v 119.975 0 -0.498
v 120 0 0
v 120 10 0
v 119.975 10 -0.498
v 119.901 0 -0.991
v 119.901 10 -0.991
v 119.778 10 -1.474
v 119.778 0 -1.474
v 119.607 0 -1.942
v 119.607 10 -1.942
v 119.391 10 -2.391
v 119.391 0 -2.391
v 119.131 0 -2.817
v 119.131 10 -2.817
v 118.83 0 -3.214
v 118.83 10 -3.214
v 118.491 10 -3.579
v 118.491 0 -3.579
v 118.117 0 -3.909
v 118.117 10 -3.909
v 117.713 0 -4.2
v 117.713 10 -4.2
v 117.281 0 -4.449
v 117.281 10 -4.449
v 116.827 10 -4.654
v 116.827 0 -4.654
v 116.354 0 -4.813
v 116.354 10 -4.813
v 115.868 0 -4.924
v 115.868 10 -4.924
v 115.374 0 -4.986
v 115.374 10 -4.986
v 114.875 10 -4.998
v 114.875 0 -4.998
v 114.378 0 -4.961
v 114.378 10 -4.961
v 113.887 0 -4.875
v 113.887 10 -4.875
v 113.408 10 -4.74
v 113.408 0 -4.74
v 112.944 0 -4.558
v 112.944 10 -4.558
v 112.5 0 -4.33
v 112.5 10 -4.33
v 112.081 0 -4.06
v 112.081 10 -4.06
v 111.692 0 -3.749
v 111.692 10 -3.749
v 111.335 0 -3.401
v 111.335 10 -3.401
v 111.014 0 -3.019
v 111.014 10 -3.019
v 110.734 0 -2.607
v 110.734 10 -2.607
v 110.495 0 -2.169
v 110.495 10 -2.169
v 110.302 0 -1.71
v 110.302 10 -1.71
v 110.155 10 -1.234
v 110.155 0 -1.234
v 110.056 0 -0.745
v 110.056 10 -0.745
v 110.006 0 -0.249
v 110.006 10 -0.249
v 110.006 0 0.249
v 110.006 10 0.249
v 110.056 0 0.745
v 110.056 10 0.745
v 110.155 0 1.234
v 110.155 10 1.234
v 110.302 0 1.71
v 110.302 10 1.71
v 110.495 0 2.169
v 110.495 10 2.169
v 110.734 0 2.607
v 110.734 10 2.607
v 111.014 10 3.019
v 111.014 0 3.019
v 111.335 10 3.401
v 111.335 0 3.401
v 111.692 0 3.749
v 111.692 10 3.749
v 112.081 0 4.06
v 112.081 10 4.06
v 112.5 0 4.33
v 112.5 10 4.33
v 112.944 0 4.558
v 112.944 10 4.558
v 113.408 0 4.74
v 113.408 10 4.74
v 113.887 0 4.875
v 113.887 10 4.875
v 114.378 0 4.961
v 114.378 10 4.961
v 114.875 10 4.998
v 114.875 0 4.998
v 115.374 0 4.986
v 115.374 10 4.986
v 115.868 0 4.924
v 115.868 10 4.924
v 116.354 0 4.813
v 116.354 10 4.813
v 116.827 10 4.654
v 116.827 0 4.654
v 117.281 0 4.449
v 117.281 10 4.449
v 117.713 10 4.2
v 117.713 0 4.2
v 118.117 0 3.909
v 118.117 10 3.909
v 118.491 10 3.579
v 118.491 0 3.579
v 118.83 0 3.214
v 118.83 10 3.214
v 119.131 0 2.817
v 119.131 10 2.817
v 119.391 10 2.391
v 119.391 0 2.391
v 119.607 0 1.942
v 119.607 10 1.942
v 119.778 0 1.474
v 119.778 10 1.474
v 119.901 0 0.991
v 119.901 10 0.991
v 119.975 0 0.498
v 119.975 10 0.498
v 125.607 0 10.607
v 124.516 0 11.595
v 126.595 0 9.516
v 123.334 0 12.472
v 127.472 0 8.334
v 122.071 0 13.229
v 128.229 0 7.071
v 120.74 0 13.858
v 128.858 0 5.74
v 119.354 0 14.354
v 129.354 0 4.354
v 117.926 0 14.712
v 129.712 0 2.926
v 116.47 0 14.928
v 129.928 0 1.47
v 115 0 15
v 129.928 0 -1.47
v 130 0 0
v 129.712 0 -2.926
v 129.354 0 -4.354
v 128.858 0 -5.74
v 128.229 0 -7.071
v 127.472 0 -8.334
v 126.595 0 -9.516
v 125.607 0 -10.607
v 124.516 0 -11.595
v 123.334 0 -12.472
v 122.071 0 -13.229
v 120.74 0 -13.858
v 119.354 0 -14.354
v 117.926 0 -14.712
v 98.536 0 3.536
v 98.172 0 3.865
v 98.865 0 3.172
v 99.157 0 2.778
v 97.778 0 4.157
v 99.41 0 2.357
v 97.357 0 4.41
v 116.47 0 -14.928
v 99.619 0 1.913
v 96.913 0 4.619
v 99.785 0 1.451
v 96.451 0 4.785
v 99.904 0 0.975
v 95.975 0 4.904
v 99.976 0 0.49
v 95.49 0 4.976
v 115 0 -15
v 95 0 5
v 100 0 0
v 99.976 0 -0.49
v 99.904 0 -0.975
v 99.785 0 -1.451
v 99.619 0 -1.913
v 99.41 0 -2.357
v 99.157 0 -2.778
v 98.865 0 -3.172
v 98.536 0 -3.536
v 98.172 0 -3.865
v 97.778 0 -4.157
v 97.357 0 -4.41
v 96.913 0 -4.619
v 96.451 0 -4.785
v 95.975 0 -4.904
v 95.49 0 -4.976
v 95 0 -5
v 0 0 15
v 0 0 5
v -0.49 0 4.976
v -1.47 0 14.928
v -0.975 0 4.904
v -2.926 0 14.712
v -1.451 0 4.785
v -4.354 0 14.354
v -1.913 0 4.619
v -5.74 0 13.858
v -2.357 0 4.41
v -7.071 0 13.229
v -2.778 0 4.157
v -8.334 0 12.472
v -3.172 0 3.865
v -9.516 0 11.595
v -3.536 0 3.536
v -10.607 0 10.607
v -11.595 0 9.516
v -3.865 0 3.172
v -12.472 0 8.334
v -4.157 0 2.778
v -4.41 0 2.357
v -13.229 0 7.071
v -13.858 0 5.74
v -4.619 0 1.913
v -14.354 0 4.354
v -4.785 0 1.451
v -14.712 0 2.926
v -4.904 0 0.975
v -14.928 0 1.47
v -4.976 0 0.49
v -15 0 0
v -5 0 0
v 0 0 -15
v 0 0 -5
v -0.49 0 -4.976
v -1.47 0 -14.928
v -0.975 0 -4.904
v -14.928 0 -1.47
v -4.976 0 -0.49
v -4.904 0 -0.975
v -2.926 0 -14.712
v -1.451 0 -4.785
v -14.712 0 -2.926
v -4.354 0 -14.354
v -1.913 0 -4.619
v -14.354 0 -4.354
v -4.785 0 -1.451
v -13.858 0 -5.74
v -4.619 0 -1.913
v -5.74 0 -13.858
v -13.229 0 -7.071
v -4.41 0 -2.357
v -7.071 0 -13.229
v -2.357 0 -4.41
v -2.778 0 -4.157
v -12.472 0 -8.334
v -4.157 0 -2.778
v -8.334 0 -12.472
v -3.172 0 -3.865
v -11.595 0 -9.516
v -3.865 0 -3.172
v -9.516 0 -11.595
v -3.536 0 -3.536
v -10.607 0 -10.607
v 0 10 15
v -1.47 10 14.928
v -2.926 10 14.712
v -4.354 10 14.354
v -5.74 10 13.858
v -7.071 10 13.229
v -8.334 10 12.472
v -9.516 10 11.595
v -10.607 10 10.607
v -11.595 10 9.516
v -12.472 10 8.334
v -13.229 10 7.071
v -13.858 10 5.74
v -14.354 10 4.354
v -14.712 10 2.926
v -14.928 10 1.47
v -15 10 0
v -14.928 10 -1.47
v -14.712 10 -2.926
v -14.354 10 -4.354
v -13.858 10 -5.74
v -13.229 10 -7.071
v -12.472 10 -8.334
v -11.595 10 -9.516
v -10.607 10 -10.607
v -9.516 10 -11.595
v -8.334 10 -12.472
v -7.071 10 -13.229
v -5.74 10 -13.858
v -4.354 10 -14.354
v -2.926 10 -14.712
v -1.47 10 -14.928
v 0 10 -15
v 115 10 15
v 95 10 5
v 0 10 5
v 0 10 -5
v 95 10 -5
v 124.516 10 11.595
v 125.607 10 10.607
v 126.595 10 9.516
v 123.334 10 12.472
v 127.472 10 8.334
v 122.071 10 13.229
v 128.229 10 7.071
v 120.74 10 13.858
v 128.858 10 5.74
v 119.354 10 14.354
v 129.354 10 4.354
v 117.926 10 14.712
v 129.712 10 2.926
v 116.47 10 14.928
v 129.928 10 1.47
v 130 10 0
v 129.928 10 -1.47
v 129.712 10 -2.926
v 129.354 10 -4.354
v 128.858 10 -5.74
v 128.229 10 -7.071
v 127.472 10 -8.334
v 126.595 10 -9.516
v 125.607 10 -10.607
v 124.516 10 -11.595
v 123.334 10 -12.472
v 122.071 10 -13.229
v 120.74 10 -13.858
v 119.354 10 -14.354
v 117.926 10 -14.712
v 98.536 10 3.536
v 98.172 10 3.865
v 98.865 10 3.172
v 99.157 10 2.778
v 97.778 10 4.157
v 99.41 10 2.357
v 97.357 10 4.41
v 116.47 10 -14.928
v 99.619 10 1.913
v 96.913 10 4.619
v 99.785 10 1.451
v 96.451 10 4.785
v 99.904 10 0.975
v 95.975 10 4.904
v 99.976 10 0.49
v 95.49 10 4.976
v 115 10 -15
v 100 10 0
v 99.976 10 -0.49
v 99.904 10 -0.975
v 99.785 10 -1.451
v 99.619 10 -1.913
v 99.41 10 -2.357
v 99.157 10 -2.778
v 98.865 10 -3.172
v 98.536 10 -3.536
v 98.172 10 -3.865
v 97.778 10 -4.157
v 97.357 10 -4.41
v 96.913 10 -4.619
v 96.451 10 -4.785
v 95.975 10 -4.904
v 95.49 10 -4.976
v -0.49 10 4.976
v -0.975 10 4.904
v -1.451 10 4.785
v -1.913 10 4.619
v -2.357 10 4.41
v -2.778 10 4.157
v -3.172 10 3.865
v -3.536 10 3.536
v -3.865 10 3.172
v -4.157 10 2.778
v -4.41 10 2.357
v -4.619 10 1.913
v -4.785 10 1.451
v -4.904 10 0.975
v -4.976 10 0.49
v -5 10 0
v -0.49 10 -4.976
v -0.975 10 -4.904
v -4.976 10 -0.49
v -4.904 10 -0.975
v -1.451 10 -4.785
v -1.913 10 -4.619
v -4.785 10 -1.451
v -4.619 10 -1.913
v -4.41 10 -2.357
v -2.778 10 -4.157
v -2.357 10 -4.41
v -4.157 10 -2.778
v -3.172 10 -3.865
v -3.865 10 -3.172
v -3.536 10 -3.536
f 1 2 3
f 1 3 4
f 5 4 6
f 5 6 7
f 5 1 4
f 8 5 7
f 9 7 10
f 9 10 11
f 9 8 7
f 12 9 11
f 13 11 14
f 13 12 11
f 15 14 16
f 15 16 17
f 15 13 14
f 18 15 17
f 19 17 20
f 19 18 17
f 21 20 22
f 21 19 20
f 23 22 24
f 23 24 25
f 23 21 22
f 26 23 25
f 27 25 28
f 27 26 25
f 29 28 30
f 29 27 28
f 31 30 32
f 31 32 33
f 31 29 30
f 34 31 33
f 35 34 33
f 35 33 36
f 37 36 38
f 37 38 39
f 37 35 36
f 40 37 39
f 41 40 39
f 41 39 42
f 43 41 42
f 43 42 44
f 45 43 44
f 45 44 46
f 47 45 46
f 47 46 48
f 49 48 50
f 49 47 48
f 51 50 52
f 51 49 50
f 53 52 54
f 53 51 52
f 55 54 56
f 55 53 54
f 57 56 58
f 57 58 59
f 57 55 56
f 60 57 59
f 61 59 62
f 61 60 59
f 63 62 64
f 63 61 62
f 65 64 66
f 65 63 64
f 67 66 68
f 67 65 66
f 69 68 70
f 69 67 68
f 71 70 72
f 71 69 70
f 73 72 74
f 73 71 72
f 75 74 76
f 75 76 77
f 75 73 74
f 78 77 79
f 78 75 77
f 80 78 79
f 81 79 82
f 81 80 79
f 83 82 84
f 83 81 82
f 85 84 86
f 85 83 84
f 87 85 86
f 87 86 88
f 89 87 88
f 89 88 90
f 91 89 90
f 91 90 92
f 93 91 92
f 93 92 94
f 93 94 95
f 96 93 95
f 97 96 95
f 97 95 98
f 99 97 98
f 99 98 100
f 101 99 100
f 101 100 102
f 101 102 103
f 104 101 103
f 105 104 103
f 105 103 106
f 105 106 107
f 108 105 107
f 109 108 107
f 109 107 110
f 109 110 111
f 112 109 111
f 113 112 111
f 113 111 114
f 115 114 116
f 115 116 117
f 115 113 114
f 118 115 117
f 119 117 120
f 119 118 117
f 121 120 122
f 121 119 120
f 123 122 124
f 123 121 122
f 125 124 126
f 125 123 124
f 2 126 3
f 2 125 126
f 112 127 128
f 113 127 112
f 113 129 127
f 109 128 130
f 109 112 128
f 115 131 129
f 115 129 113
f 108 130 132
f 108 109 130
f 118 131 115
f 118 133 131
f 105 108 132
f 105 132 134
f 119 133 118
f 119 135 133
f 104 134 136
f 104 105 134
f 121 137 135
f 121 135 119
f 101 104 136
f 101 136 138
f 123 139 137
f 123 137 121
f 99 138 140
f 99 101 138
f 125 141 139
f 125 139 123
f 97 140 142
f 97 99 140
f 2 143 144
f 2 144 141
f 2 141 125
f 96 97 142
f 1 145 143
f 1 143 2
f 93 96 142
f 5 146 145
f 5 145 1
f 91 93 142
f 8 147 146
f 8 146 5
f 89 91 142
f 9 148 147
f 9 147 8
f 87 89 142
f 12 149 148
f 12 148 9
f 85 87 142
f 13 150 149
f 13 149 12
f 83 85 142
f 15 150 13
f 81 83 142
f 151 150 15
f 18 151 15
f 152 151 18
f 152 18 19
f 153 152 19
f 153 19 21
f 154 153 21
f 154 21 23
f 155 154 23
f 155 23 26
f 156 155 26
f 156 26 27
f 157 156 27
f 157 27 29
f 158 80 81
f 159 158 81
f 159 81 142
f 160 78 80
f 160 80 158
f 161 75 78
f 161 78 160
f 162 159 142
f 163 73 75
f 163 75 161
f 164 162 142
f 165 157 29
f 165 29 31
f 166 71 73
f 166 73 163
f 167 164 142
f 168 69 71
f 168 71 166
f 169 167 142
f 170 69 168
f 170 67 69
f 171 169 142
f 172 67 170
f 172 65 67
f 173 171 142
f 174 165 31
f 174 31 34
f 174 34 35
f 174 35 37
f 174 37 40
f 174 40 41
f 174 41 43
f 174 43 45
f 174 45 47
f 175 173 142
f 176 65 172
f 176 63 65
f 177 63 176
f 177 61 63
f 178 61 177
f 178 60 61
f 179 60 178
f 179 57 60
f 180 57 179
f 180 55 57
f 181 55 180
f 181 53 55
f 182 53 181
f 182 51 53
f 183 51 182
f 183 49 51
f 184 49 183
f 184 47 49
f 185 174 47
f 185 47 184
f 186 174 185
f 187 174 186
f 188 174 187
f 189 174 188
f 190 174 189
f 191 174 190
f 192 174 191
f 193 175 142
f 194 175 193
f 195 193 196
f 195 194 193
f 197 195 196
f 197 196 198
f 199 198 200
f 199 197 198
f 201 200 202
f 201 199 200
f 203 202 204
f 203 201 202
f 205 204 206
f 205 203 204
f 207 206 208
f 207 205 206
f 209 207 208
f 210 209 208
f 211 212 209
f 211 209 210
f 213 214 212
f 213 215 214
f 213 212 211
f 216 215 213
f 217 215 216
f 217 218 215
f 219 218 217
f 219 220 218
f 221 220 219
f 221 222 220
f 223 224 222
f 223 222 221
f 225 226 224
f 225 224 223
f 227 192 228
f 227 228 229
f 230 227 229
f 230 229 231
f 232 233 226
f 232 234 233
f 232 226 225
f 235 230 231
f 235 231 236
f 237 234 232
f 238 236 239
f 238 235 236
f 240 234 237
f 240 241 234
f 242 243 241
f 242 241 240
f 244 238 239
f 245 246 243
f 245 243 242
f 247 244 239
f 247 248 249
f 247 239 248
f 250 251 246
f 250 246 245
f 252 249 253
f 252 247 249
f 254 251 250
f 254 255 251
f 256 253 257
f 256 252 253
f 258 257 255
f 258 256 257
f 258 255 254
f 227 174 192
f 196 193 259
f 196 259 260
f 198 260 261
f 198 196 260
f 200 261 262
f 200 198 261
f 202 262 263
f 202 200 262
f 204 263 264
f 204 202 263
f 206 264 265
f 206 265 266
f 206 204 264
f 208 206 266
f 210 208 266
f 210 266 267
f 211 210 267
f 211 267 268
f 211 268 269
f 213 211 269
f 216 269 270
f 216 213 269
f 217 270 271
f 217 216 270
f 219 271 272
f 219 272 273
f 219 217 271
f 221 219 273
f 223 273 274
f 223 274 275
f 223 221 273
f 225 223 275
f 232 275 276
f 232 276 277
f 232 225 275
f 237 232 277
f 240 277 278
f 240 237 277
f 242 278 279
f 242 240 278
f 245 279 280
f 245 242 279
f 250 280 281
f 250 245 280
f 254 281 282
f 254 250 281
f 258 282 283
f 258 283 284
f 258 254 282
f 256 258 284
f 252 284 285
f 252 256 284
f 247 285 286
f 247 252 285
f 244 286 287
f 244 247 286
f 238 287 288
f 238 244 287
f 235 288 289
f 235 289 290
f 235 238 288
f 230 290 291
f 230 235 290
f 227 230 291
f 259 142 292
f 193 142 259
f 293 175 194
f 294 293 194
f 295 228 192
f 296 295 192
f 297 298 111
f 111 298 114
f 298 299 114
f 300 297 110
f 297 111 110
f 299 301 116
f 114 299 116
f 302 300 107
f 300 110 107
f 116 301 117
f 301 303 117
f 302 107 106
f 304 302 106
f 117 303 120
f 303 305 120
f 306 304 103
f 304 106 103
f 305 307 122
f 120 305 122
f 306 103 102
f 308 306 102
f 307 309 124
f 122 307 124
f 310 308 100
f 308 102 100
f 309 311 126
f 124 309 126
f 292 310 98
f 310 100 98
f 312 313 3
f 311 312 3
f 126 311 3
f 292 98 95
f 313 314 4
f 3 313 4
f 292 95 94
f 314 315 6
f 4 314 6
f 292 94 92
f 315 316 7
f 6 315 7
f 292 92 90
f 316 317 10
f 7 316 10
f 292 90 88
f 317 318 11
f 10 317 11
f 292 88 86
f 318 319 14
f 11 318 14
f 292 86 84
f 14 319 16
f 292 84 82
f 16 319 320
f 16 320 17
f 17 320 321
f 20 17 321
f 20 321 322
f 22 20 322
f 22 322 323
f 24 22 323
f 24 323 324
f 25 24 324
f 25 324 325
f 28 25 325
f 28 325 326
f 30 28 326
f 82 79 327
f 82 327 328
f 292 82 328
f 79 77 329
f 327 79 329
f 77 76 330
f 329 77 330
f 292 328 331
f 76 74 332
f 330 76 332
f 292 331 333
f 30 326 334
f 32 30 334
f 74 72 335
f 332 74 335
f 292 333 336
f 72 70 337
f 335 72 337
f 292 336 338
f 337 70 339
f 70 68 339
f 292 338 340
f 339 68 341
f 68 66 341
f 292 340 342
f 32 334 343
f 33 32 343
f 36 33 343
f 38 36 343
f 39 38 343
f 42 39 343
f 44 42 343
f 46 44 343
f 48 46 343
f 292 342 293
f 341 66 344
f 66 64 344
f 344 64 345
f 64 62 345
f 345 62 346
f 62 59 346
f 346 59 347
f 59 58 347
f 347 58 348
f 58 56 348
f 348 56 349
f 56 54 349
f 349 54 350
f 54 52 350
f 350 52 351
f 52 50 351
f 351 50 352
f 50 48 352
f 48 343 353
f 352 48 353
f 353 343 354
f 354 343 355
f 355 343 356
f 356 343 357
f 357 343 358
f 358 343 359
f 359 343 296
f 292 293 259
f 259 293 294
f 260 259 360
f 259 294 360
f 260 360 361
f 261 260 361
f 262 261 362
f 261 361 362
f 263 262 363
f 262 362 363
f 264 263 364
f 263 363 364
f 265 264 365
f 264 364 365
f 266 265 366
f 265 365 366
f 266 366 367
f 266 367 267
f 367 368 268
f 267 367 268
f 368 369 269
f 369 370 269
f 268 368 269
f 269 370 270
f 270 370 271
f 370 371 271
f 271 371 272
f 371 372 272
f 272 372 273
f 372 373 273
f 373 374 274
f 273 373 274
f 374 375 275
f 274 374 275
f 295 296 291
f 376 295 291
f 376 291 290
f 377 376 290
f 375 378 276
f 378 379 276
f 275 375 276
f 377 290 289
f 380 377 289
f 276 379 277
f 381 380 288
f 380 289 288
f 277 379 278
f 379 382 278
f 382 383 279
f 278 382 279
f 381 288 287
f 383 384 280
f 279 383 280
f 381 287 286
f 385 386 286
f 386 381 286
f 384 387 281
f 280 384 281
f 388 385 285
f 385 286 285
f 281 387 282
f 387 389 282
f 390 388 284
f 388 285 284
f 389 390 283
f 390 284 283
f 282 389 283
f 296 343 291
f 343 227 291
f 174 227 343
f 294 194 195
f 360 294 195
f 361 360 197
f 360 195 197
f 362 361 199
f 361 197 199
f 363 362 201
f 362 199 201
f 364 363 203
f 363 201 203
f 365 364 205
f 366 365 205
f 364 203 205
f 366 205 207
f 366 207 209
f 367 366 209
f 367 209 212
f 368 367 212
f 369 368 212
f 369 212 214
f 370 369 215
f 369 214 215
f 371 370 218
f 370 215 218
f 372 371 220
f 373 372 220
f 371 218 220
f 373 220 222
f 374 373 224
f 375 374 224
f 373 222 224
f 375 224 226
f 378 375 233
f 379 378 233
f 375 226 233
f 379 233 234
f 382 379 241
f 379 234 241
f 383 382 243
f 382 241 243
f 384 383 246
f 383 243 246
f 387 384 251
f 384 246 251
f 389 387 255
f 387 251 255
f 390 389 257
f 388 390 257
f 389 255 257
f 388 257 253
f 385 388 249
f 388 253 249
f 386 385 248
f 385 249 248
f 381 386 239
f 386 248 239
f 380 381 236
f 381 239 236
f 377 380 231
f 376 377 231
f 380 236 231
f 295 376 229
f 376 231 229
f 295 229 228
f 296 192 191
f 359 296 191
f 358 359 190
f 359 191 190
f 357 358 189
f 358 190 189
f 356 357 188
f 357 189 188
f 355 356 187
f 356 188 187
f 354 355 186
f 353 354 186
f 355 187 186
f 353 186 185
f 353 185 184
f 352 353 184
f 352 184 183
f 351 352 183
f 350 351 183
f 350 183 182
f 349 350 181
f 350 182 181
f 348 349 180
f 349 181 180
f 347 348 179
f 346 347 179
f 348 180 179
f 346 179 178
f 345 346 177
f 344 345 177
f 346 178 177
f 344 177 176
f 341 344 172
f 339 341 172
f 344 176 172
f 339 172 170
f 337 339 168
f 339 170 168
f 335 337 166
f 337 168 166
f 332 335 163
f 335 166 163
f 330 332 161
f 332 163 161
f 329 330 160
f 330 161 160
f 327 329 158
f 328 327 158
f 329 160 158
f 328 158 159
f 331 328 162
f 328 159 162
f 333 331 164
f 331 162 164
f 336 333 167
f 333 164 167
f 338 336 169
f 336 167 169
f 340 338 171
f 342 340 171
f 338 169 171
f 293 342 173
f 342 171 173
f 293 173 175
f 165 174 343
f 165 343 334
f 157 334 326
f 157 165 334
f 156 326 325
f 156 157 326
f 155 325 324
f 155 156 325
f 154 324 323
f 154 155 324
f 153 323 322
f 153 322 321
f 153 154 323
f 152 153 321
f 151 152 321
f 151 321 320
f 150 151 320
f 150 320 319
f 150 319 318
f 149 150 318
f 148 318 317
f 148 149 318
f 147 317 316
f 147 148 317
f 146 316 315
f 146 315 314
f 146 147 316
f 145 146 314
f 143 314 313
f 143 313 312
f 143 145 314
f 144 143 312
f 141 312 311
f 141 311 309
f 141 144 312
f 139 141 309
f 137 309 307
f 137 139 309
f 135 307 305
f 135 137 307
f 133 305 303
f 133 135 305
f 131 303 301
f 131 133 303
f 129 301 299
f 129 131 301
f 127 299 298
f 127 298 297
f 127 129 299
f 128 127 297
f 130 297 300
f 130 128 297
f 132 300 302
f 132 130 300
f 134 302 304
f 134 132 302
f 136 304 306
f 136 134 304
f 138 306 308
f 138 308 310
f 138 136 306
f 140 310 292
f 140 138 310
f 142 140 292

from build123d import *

# Parameters (mm, degrees)
SKETCH1_R           = 5
BOSS_EXTRUDE1_DEPTH = 10


with BuildPart() as part:
    # Sketch1 → Boss-Extrude1 (new body)
    with BuildSketch(Plane(origin=(0, 0, 0), x_dir=(1, 0, 0), z_dir=(0, 1, 0))):
        with BuildLine():
            Line((0, 15), (115, 15))
            ThreePointArc((115, 15), (130, 0), (115, -15))
            Line((115, -15), (0, -15))
            ThreePointArc((0, -15), (-15, 0), (0, 15))
        make_face()
        with Locations((115, 0)):
            Circle(SKETCH1_R, mode=Mode.SUBTRACT)
        with BuildLine():
            Line((0, 5), (95, 5))
            ThreePointArc((95, 5), (100, 0), (95, -5))
            Line((95, -5), (0, -5))
            ThreePointArc((0, -5), (-5, 0), (0, 5))
        make_face(mode=Mode.SUBTRACT)
    extrude(amount=BOSS_EXTRUDE1_DEPTH)


solid = part.part
